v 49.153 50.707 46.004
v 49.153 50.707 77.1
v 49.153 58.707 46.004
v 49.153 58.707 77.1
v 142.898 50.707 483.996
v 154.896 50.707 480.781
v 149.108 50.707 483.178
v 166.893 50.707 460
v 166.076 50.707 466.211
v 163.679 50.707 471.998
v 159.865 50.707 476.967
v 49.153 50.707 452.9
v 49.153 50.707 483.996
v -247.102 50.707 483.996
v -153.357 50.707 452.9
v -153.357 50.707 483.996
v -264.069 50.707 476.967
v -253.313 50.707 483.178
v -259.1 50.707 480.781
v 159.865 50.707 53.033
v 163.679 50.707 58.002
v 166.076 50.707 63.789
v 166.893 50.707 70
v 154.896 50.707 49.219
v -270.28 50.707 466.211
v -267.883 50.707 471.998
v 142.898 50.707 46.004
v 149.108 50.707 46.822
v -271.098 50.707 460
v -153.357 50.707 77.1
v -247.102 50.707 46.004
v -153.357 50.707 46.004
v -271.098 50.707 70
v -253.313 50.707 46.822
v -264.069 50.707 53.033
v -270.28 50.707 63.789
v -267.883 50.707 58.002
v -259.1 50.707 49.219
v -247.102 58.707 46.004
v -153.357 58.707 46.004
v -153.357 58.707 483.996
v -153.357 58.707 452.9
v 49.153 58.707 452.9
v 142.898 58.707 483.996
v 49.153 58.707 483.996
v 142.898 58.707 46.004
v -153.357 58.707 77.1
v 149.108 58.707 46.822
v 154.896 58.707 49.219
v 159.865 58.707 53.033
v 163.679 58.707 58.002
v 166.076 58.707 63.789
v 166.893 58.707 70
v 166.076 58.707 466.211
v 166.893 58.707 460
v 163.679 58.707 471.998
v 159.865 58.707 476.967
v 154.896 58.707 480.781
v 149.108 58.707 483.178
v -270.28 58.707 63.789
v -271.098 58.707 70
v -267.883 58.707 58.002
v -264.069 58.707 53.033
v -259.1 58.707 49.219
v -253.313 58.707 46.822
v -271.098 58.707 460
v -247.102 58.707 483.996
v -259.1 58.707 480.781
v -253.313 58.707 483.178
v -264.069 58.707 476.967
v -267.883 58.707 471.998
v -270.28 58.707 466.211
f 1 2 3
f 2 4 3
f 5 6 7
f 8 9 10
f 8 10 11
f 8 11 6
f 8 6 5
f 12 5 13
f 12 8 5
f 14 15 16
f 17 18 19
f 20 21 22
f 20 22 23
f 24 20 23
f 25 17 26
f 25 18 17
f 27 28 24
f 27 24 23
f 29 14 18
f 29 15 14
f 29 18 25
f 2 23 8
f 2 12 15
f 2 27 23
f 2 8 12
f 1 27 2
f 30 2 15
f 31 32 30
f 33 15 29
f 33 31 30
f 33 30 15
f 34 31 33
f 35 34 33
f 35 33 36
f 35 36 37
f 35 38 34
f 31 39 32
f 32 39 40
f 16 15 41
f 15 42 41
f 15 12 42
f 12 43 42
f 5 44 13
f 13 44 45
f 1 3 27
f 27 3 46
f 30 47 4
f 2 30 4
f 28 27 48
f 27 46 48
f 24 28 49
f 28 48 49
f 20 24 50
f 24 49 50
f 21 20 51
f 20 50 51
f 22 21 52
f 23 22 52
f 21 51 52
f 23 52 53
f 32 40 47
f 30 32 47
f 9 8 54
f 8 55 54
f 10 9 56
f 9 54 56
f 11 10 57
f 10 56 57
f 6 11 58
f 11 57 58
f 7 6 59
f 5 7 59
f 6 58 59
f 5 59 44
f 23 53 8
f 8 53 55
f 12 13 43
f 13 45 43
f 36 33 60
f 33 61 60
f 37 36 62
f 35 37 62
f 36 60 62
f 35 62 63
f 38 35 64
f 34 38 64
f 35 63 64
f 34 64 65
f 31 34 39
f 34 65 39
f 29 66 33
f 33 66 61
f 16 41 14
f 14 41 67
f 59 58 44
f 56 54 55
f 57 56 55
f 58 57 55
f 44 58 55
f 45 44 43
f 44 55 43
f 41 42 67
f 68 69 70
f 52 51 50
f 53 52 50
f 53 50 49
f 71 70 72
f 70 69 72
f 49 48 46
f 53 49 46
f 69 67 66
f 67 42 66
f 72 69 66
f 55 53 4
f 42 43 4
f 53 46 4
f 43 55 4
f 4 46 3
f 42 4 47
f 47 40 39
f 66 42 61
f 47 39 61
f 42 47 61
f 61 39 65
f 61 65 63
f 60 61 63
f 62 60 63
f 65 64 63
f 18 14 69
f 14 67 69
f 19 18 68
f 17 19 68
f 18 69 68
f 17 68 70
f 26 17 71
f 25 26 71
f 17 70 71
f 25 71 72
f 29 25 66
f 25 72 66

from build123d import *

# Parameters (mm, degrees)
SALIENTE_EXTRUIR1_DEPTH = 4


with BuildPart() as part:
    # Croquis1 → Saliente-Extruir1 (new, symmetric)
    with BuildSketch(Plane(origin=(0, 54.707138557, 0), x_dir=(1, 0, 0), z_dir=(0, 1, 0))):
        with BuildLine():
            Line((-153.357036721, -77.1), (49.152963279, -77.1))
            Line((49.152963279, -77.1), (49.152963279, -46.00446543))
            Line((49.152963279, -46.00446543), (142.897963279, -46.00446543))
            ThreePointArc((142.897963279, -46.00446543), (159.865368491, -53.032594788), (166.893497848, -70))
            Line((166.893497848, -70), (166.893497848, -460))
            ThreePointArc((166.893497848, -460), (159.865368491, -476.967405212), (142.897963279, -483.99553457))
            Line((142.897963279, -483.99553457), (49.152963279, -483.99553457))
            Line((49.152963279, -483.99553457), (49.152963279, -452.9))
            Line((49.152963279, -452.9), (-153.357036721, -452.9))
            Line((-153.357036721, -452.9), (-153.357036721, -483.99553457))
            Line((-153.357036721, -483.99553457), (-247.102036721, -483.99553457))
            ThreePointArc((-247.102036721, -483.99553457), (-264.069441934, -476.967405212), (-271.097571291, -460))
            Line((-271.097571291, -460), (-271.097571291, -70))
            ThreePointArc((-271.097571291, -70), (-264.069441934, -53.032594788), (-247.102036721, -46.00446543))
            Line((-247.102036721, -46.00446543), (-153.357036721, -46.00446543))
            Line((-153.357036721, -46.00446543), (-153.357036721, -77.1))
        make_face()
    extrude(amount=SALIENTE_EXTRUIR1_DEPTH, both=True)


solid = part.part
